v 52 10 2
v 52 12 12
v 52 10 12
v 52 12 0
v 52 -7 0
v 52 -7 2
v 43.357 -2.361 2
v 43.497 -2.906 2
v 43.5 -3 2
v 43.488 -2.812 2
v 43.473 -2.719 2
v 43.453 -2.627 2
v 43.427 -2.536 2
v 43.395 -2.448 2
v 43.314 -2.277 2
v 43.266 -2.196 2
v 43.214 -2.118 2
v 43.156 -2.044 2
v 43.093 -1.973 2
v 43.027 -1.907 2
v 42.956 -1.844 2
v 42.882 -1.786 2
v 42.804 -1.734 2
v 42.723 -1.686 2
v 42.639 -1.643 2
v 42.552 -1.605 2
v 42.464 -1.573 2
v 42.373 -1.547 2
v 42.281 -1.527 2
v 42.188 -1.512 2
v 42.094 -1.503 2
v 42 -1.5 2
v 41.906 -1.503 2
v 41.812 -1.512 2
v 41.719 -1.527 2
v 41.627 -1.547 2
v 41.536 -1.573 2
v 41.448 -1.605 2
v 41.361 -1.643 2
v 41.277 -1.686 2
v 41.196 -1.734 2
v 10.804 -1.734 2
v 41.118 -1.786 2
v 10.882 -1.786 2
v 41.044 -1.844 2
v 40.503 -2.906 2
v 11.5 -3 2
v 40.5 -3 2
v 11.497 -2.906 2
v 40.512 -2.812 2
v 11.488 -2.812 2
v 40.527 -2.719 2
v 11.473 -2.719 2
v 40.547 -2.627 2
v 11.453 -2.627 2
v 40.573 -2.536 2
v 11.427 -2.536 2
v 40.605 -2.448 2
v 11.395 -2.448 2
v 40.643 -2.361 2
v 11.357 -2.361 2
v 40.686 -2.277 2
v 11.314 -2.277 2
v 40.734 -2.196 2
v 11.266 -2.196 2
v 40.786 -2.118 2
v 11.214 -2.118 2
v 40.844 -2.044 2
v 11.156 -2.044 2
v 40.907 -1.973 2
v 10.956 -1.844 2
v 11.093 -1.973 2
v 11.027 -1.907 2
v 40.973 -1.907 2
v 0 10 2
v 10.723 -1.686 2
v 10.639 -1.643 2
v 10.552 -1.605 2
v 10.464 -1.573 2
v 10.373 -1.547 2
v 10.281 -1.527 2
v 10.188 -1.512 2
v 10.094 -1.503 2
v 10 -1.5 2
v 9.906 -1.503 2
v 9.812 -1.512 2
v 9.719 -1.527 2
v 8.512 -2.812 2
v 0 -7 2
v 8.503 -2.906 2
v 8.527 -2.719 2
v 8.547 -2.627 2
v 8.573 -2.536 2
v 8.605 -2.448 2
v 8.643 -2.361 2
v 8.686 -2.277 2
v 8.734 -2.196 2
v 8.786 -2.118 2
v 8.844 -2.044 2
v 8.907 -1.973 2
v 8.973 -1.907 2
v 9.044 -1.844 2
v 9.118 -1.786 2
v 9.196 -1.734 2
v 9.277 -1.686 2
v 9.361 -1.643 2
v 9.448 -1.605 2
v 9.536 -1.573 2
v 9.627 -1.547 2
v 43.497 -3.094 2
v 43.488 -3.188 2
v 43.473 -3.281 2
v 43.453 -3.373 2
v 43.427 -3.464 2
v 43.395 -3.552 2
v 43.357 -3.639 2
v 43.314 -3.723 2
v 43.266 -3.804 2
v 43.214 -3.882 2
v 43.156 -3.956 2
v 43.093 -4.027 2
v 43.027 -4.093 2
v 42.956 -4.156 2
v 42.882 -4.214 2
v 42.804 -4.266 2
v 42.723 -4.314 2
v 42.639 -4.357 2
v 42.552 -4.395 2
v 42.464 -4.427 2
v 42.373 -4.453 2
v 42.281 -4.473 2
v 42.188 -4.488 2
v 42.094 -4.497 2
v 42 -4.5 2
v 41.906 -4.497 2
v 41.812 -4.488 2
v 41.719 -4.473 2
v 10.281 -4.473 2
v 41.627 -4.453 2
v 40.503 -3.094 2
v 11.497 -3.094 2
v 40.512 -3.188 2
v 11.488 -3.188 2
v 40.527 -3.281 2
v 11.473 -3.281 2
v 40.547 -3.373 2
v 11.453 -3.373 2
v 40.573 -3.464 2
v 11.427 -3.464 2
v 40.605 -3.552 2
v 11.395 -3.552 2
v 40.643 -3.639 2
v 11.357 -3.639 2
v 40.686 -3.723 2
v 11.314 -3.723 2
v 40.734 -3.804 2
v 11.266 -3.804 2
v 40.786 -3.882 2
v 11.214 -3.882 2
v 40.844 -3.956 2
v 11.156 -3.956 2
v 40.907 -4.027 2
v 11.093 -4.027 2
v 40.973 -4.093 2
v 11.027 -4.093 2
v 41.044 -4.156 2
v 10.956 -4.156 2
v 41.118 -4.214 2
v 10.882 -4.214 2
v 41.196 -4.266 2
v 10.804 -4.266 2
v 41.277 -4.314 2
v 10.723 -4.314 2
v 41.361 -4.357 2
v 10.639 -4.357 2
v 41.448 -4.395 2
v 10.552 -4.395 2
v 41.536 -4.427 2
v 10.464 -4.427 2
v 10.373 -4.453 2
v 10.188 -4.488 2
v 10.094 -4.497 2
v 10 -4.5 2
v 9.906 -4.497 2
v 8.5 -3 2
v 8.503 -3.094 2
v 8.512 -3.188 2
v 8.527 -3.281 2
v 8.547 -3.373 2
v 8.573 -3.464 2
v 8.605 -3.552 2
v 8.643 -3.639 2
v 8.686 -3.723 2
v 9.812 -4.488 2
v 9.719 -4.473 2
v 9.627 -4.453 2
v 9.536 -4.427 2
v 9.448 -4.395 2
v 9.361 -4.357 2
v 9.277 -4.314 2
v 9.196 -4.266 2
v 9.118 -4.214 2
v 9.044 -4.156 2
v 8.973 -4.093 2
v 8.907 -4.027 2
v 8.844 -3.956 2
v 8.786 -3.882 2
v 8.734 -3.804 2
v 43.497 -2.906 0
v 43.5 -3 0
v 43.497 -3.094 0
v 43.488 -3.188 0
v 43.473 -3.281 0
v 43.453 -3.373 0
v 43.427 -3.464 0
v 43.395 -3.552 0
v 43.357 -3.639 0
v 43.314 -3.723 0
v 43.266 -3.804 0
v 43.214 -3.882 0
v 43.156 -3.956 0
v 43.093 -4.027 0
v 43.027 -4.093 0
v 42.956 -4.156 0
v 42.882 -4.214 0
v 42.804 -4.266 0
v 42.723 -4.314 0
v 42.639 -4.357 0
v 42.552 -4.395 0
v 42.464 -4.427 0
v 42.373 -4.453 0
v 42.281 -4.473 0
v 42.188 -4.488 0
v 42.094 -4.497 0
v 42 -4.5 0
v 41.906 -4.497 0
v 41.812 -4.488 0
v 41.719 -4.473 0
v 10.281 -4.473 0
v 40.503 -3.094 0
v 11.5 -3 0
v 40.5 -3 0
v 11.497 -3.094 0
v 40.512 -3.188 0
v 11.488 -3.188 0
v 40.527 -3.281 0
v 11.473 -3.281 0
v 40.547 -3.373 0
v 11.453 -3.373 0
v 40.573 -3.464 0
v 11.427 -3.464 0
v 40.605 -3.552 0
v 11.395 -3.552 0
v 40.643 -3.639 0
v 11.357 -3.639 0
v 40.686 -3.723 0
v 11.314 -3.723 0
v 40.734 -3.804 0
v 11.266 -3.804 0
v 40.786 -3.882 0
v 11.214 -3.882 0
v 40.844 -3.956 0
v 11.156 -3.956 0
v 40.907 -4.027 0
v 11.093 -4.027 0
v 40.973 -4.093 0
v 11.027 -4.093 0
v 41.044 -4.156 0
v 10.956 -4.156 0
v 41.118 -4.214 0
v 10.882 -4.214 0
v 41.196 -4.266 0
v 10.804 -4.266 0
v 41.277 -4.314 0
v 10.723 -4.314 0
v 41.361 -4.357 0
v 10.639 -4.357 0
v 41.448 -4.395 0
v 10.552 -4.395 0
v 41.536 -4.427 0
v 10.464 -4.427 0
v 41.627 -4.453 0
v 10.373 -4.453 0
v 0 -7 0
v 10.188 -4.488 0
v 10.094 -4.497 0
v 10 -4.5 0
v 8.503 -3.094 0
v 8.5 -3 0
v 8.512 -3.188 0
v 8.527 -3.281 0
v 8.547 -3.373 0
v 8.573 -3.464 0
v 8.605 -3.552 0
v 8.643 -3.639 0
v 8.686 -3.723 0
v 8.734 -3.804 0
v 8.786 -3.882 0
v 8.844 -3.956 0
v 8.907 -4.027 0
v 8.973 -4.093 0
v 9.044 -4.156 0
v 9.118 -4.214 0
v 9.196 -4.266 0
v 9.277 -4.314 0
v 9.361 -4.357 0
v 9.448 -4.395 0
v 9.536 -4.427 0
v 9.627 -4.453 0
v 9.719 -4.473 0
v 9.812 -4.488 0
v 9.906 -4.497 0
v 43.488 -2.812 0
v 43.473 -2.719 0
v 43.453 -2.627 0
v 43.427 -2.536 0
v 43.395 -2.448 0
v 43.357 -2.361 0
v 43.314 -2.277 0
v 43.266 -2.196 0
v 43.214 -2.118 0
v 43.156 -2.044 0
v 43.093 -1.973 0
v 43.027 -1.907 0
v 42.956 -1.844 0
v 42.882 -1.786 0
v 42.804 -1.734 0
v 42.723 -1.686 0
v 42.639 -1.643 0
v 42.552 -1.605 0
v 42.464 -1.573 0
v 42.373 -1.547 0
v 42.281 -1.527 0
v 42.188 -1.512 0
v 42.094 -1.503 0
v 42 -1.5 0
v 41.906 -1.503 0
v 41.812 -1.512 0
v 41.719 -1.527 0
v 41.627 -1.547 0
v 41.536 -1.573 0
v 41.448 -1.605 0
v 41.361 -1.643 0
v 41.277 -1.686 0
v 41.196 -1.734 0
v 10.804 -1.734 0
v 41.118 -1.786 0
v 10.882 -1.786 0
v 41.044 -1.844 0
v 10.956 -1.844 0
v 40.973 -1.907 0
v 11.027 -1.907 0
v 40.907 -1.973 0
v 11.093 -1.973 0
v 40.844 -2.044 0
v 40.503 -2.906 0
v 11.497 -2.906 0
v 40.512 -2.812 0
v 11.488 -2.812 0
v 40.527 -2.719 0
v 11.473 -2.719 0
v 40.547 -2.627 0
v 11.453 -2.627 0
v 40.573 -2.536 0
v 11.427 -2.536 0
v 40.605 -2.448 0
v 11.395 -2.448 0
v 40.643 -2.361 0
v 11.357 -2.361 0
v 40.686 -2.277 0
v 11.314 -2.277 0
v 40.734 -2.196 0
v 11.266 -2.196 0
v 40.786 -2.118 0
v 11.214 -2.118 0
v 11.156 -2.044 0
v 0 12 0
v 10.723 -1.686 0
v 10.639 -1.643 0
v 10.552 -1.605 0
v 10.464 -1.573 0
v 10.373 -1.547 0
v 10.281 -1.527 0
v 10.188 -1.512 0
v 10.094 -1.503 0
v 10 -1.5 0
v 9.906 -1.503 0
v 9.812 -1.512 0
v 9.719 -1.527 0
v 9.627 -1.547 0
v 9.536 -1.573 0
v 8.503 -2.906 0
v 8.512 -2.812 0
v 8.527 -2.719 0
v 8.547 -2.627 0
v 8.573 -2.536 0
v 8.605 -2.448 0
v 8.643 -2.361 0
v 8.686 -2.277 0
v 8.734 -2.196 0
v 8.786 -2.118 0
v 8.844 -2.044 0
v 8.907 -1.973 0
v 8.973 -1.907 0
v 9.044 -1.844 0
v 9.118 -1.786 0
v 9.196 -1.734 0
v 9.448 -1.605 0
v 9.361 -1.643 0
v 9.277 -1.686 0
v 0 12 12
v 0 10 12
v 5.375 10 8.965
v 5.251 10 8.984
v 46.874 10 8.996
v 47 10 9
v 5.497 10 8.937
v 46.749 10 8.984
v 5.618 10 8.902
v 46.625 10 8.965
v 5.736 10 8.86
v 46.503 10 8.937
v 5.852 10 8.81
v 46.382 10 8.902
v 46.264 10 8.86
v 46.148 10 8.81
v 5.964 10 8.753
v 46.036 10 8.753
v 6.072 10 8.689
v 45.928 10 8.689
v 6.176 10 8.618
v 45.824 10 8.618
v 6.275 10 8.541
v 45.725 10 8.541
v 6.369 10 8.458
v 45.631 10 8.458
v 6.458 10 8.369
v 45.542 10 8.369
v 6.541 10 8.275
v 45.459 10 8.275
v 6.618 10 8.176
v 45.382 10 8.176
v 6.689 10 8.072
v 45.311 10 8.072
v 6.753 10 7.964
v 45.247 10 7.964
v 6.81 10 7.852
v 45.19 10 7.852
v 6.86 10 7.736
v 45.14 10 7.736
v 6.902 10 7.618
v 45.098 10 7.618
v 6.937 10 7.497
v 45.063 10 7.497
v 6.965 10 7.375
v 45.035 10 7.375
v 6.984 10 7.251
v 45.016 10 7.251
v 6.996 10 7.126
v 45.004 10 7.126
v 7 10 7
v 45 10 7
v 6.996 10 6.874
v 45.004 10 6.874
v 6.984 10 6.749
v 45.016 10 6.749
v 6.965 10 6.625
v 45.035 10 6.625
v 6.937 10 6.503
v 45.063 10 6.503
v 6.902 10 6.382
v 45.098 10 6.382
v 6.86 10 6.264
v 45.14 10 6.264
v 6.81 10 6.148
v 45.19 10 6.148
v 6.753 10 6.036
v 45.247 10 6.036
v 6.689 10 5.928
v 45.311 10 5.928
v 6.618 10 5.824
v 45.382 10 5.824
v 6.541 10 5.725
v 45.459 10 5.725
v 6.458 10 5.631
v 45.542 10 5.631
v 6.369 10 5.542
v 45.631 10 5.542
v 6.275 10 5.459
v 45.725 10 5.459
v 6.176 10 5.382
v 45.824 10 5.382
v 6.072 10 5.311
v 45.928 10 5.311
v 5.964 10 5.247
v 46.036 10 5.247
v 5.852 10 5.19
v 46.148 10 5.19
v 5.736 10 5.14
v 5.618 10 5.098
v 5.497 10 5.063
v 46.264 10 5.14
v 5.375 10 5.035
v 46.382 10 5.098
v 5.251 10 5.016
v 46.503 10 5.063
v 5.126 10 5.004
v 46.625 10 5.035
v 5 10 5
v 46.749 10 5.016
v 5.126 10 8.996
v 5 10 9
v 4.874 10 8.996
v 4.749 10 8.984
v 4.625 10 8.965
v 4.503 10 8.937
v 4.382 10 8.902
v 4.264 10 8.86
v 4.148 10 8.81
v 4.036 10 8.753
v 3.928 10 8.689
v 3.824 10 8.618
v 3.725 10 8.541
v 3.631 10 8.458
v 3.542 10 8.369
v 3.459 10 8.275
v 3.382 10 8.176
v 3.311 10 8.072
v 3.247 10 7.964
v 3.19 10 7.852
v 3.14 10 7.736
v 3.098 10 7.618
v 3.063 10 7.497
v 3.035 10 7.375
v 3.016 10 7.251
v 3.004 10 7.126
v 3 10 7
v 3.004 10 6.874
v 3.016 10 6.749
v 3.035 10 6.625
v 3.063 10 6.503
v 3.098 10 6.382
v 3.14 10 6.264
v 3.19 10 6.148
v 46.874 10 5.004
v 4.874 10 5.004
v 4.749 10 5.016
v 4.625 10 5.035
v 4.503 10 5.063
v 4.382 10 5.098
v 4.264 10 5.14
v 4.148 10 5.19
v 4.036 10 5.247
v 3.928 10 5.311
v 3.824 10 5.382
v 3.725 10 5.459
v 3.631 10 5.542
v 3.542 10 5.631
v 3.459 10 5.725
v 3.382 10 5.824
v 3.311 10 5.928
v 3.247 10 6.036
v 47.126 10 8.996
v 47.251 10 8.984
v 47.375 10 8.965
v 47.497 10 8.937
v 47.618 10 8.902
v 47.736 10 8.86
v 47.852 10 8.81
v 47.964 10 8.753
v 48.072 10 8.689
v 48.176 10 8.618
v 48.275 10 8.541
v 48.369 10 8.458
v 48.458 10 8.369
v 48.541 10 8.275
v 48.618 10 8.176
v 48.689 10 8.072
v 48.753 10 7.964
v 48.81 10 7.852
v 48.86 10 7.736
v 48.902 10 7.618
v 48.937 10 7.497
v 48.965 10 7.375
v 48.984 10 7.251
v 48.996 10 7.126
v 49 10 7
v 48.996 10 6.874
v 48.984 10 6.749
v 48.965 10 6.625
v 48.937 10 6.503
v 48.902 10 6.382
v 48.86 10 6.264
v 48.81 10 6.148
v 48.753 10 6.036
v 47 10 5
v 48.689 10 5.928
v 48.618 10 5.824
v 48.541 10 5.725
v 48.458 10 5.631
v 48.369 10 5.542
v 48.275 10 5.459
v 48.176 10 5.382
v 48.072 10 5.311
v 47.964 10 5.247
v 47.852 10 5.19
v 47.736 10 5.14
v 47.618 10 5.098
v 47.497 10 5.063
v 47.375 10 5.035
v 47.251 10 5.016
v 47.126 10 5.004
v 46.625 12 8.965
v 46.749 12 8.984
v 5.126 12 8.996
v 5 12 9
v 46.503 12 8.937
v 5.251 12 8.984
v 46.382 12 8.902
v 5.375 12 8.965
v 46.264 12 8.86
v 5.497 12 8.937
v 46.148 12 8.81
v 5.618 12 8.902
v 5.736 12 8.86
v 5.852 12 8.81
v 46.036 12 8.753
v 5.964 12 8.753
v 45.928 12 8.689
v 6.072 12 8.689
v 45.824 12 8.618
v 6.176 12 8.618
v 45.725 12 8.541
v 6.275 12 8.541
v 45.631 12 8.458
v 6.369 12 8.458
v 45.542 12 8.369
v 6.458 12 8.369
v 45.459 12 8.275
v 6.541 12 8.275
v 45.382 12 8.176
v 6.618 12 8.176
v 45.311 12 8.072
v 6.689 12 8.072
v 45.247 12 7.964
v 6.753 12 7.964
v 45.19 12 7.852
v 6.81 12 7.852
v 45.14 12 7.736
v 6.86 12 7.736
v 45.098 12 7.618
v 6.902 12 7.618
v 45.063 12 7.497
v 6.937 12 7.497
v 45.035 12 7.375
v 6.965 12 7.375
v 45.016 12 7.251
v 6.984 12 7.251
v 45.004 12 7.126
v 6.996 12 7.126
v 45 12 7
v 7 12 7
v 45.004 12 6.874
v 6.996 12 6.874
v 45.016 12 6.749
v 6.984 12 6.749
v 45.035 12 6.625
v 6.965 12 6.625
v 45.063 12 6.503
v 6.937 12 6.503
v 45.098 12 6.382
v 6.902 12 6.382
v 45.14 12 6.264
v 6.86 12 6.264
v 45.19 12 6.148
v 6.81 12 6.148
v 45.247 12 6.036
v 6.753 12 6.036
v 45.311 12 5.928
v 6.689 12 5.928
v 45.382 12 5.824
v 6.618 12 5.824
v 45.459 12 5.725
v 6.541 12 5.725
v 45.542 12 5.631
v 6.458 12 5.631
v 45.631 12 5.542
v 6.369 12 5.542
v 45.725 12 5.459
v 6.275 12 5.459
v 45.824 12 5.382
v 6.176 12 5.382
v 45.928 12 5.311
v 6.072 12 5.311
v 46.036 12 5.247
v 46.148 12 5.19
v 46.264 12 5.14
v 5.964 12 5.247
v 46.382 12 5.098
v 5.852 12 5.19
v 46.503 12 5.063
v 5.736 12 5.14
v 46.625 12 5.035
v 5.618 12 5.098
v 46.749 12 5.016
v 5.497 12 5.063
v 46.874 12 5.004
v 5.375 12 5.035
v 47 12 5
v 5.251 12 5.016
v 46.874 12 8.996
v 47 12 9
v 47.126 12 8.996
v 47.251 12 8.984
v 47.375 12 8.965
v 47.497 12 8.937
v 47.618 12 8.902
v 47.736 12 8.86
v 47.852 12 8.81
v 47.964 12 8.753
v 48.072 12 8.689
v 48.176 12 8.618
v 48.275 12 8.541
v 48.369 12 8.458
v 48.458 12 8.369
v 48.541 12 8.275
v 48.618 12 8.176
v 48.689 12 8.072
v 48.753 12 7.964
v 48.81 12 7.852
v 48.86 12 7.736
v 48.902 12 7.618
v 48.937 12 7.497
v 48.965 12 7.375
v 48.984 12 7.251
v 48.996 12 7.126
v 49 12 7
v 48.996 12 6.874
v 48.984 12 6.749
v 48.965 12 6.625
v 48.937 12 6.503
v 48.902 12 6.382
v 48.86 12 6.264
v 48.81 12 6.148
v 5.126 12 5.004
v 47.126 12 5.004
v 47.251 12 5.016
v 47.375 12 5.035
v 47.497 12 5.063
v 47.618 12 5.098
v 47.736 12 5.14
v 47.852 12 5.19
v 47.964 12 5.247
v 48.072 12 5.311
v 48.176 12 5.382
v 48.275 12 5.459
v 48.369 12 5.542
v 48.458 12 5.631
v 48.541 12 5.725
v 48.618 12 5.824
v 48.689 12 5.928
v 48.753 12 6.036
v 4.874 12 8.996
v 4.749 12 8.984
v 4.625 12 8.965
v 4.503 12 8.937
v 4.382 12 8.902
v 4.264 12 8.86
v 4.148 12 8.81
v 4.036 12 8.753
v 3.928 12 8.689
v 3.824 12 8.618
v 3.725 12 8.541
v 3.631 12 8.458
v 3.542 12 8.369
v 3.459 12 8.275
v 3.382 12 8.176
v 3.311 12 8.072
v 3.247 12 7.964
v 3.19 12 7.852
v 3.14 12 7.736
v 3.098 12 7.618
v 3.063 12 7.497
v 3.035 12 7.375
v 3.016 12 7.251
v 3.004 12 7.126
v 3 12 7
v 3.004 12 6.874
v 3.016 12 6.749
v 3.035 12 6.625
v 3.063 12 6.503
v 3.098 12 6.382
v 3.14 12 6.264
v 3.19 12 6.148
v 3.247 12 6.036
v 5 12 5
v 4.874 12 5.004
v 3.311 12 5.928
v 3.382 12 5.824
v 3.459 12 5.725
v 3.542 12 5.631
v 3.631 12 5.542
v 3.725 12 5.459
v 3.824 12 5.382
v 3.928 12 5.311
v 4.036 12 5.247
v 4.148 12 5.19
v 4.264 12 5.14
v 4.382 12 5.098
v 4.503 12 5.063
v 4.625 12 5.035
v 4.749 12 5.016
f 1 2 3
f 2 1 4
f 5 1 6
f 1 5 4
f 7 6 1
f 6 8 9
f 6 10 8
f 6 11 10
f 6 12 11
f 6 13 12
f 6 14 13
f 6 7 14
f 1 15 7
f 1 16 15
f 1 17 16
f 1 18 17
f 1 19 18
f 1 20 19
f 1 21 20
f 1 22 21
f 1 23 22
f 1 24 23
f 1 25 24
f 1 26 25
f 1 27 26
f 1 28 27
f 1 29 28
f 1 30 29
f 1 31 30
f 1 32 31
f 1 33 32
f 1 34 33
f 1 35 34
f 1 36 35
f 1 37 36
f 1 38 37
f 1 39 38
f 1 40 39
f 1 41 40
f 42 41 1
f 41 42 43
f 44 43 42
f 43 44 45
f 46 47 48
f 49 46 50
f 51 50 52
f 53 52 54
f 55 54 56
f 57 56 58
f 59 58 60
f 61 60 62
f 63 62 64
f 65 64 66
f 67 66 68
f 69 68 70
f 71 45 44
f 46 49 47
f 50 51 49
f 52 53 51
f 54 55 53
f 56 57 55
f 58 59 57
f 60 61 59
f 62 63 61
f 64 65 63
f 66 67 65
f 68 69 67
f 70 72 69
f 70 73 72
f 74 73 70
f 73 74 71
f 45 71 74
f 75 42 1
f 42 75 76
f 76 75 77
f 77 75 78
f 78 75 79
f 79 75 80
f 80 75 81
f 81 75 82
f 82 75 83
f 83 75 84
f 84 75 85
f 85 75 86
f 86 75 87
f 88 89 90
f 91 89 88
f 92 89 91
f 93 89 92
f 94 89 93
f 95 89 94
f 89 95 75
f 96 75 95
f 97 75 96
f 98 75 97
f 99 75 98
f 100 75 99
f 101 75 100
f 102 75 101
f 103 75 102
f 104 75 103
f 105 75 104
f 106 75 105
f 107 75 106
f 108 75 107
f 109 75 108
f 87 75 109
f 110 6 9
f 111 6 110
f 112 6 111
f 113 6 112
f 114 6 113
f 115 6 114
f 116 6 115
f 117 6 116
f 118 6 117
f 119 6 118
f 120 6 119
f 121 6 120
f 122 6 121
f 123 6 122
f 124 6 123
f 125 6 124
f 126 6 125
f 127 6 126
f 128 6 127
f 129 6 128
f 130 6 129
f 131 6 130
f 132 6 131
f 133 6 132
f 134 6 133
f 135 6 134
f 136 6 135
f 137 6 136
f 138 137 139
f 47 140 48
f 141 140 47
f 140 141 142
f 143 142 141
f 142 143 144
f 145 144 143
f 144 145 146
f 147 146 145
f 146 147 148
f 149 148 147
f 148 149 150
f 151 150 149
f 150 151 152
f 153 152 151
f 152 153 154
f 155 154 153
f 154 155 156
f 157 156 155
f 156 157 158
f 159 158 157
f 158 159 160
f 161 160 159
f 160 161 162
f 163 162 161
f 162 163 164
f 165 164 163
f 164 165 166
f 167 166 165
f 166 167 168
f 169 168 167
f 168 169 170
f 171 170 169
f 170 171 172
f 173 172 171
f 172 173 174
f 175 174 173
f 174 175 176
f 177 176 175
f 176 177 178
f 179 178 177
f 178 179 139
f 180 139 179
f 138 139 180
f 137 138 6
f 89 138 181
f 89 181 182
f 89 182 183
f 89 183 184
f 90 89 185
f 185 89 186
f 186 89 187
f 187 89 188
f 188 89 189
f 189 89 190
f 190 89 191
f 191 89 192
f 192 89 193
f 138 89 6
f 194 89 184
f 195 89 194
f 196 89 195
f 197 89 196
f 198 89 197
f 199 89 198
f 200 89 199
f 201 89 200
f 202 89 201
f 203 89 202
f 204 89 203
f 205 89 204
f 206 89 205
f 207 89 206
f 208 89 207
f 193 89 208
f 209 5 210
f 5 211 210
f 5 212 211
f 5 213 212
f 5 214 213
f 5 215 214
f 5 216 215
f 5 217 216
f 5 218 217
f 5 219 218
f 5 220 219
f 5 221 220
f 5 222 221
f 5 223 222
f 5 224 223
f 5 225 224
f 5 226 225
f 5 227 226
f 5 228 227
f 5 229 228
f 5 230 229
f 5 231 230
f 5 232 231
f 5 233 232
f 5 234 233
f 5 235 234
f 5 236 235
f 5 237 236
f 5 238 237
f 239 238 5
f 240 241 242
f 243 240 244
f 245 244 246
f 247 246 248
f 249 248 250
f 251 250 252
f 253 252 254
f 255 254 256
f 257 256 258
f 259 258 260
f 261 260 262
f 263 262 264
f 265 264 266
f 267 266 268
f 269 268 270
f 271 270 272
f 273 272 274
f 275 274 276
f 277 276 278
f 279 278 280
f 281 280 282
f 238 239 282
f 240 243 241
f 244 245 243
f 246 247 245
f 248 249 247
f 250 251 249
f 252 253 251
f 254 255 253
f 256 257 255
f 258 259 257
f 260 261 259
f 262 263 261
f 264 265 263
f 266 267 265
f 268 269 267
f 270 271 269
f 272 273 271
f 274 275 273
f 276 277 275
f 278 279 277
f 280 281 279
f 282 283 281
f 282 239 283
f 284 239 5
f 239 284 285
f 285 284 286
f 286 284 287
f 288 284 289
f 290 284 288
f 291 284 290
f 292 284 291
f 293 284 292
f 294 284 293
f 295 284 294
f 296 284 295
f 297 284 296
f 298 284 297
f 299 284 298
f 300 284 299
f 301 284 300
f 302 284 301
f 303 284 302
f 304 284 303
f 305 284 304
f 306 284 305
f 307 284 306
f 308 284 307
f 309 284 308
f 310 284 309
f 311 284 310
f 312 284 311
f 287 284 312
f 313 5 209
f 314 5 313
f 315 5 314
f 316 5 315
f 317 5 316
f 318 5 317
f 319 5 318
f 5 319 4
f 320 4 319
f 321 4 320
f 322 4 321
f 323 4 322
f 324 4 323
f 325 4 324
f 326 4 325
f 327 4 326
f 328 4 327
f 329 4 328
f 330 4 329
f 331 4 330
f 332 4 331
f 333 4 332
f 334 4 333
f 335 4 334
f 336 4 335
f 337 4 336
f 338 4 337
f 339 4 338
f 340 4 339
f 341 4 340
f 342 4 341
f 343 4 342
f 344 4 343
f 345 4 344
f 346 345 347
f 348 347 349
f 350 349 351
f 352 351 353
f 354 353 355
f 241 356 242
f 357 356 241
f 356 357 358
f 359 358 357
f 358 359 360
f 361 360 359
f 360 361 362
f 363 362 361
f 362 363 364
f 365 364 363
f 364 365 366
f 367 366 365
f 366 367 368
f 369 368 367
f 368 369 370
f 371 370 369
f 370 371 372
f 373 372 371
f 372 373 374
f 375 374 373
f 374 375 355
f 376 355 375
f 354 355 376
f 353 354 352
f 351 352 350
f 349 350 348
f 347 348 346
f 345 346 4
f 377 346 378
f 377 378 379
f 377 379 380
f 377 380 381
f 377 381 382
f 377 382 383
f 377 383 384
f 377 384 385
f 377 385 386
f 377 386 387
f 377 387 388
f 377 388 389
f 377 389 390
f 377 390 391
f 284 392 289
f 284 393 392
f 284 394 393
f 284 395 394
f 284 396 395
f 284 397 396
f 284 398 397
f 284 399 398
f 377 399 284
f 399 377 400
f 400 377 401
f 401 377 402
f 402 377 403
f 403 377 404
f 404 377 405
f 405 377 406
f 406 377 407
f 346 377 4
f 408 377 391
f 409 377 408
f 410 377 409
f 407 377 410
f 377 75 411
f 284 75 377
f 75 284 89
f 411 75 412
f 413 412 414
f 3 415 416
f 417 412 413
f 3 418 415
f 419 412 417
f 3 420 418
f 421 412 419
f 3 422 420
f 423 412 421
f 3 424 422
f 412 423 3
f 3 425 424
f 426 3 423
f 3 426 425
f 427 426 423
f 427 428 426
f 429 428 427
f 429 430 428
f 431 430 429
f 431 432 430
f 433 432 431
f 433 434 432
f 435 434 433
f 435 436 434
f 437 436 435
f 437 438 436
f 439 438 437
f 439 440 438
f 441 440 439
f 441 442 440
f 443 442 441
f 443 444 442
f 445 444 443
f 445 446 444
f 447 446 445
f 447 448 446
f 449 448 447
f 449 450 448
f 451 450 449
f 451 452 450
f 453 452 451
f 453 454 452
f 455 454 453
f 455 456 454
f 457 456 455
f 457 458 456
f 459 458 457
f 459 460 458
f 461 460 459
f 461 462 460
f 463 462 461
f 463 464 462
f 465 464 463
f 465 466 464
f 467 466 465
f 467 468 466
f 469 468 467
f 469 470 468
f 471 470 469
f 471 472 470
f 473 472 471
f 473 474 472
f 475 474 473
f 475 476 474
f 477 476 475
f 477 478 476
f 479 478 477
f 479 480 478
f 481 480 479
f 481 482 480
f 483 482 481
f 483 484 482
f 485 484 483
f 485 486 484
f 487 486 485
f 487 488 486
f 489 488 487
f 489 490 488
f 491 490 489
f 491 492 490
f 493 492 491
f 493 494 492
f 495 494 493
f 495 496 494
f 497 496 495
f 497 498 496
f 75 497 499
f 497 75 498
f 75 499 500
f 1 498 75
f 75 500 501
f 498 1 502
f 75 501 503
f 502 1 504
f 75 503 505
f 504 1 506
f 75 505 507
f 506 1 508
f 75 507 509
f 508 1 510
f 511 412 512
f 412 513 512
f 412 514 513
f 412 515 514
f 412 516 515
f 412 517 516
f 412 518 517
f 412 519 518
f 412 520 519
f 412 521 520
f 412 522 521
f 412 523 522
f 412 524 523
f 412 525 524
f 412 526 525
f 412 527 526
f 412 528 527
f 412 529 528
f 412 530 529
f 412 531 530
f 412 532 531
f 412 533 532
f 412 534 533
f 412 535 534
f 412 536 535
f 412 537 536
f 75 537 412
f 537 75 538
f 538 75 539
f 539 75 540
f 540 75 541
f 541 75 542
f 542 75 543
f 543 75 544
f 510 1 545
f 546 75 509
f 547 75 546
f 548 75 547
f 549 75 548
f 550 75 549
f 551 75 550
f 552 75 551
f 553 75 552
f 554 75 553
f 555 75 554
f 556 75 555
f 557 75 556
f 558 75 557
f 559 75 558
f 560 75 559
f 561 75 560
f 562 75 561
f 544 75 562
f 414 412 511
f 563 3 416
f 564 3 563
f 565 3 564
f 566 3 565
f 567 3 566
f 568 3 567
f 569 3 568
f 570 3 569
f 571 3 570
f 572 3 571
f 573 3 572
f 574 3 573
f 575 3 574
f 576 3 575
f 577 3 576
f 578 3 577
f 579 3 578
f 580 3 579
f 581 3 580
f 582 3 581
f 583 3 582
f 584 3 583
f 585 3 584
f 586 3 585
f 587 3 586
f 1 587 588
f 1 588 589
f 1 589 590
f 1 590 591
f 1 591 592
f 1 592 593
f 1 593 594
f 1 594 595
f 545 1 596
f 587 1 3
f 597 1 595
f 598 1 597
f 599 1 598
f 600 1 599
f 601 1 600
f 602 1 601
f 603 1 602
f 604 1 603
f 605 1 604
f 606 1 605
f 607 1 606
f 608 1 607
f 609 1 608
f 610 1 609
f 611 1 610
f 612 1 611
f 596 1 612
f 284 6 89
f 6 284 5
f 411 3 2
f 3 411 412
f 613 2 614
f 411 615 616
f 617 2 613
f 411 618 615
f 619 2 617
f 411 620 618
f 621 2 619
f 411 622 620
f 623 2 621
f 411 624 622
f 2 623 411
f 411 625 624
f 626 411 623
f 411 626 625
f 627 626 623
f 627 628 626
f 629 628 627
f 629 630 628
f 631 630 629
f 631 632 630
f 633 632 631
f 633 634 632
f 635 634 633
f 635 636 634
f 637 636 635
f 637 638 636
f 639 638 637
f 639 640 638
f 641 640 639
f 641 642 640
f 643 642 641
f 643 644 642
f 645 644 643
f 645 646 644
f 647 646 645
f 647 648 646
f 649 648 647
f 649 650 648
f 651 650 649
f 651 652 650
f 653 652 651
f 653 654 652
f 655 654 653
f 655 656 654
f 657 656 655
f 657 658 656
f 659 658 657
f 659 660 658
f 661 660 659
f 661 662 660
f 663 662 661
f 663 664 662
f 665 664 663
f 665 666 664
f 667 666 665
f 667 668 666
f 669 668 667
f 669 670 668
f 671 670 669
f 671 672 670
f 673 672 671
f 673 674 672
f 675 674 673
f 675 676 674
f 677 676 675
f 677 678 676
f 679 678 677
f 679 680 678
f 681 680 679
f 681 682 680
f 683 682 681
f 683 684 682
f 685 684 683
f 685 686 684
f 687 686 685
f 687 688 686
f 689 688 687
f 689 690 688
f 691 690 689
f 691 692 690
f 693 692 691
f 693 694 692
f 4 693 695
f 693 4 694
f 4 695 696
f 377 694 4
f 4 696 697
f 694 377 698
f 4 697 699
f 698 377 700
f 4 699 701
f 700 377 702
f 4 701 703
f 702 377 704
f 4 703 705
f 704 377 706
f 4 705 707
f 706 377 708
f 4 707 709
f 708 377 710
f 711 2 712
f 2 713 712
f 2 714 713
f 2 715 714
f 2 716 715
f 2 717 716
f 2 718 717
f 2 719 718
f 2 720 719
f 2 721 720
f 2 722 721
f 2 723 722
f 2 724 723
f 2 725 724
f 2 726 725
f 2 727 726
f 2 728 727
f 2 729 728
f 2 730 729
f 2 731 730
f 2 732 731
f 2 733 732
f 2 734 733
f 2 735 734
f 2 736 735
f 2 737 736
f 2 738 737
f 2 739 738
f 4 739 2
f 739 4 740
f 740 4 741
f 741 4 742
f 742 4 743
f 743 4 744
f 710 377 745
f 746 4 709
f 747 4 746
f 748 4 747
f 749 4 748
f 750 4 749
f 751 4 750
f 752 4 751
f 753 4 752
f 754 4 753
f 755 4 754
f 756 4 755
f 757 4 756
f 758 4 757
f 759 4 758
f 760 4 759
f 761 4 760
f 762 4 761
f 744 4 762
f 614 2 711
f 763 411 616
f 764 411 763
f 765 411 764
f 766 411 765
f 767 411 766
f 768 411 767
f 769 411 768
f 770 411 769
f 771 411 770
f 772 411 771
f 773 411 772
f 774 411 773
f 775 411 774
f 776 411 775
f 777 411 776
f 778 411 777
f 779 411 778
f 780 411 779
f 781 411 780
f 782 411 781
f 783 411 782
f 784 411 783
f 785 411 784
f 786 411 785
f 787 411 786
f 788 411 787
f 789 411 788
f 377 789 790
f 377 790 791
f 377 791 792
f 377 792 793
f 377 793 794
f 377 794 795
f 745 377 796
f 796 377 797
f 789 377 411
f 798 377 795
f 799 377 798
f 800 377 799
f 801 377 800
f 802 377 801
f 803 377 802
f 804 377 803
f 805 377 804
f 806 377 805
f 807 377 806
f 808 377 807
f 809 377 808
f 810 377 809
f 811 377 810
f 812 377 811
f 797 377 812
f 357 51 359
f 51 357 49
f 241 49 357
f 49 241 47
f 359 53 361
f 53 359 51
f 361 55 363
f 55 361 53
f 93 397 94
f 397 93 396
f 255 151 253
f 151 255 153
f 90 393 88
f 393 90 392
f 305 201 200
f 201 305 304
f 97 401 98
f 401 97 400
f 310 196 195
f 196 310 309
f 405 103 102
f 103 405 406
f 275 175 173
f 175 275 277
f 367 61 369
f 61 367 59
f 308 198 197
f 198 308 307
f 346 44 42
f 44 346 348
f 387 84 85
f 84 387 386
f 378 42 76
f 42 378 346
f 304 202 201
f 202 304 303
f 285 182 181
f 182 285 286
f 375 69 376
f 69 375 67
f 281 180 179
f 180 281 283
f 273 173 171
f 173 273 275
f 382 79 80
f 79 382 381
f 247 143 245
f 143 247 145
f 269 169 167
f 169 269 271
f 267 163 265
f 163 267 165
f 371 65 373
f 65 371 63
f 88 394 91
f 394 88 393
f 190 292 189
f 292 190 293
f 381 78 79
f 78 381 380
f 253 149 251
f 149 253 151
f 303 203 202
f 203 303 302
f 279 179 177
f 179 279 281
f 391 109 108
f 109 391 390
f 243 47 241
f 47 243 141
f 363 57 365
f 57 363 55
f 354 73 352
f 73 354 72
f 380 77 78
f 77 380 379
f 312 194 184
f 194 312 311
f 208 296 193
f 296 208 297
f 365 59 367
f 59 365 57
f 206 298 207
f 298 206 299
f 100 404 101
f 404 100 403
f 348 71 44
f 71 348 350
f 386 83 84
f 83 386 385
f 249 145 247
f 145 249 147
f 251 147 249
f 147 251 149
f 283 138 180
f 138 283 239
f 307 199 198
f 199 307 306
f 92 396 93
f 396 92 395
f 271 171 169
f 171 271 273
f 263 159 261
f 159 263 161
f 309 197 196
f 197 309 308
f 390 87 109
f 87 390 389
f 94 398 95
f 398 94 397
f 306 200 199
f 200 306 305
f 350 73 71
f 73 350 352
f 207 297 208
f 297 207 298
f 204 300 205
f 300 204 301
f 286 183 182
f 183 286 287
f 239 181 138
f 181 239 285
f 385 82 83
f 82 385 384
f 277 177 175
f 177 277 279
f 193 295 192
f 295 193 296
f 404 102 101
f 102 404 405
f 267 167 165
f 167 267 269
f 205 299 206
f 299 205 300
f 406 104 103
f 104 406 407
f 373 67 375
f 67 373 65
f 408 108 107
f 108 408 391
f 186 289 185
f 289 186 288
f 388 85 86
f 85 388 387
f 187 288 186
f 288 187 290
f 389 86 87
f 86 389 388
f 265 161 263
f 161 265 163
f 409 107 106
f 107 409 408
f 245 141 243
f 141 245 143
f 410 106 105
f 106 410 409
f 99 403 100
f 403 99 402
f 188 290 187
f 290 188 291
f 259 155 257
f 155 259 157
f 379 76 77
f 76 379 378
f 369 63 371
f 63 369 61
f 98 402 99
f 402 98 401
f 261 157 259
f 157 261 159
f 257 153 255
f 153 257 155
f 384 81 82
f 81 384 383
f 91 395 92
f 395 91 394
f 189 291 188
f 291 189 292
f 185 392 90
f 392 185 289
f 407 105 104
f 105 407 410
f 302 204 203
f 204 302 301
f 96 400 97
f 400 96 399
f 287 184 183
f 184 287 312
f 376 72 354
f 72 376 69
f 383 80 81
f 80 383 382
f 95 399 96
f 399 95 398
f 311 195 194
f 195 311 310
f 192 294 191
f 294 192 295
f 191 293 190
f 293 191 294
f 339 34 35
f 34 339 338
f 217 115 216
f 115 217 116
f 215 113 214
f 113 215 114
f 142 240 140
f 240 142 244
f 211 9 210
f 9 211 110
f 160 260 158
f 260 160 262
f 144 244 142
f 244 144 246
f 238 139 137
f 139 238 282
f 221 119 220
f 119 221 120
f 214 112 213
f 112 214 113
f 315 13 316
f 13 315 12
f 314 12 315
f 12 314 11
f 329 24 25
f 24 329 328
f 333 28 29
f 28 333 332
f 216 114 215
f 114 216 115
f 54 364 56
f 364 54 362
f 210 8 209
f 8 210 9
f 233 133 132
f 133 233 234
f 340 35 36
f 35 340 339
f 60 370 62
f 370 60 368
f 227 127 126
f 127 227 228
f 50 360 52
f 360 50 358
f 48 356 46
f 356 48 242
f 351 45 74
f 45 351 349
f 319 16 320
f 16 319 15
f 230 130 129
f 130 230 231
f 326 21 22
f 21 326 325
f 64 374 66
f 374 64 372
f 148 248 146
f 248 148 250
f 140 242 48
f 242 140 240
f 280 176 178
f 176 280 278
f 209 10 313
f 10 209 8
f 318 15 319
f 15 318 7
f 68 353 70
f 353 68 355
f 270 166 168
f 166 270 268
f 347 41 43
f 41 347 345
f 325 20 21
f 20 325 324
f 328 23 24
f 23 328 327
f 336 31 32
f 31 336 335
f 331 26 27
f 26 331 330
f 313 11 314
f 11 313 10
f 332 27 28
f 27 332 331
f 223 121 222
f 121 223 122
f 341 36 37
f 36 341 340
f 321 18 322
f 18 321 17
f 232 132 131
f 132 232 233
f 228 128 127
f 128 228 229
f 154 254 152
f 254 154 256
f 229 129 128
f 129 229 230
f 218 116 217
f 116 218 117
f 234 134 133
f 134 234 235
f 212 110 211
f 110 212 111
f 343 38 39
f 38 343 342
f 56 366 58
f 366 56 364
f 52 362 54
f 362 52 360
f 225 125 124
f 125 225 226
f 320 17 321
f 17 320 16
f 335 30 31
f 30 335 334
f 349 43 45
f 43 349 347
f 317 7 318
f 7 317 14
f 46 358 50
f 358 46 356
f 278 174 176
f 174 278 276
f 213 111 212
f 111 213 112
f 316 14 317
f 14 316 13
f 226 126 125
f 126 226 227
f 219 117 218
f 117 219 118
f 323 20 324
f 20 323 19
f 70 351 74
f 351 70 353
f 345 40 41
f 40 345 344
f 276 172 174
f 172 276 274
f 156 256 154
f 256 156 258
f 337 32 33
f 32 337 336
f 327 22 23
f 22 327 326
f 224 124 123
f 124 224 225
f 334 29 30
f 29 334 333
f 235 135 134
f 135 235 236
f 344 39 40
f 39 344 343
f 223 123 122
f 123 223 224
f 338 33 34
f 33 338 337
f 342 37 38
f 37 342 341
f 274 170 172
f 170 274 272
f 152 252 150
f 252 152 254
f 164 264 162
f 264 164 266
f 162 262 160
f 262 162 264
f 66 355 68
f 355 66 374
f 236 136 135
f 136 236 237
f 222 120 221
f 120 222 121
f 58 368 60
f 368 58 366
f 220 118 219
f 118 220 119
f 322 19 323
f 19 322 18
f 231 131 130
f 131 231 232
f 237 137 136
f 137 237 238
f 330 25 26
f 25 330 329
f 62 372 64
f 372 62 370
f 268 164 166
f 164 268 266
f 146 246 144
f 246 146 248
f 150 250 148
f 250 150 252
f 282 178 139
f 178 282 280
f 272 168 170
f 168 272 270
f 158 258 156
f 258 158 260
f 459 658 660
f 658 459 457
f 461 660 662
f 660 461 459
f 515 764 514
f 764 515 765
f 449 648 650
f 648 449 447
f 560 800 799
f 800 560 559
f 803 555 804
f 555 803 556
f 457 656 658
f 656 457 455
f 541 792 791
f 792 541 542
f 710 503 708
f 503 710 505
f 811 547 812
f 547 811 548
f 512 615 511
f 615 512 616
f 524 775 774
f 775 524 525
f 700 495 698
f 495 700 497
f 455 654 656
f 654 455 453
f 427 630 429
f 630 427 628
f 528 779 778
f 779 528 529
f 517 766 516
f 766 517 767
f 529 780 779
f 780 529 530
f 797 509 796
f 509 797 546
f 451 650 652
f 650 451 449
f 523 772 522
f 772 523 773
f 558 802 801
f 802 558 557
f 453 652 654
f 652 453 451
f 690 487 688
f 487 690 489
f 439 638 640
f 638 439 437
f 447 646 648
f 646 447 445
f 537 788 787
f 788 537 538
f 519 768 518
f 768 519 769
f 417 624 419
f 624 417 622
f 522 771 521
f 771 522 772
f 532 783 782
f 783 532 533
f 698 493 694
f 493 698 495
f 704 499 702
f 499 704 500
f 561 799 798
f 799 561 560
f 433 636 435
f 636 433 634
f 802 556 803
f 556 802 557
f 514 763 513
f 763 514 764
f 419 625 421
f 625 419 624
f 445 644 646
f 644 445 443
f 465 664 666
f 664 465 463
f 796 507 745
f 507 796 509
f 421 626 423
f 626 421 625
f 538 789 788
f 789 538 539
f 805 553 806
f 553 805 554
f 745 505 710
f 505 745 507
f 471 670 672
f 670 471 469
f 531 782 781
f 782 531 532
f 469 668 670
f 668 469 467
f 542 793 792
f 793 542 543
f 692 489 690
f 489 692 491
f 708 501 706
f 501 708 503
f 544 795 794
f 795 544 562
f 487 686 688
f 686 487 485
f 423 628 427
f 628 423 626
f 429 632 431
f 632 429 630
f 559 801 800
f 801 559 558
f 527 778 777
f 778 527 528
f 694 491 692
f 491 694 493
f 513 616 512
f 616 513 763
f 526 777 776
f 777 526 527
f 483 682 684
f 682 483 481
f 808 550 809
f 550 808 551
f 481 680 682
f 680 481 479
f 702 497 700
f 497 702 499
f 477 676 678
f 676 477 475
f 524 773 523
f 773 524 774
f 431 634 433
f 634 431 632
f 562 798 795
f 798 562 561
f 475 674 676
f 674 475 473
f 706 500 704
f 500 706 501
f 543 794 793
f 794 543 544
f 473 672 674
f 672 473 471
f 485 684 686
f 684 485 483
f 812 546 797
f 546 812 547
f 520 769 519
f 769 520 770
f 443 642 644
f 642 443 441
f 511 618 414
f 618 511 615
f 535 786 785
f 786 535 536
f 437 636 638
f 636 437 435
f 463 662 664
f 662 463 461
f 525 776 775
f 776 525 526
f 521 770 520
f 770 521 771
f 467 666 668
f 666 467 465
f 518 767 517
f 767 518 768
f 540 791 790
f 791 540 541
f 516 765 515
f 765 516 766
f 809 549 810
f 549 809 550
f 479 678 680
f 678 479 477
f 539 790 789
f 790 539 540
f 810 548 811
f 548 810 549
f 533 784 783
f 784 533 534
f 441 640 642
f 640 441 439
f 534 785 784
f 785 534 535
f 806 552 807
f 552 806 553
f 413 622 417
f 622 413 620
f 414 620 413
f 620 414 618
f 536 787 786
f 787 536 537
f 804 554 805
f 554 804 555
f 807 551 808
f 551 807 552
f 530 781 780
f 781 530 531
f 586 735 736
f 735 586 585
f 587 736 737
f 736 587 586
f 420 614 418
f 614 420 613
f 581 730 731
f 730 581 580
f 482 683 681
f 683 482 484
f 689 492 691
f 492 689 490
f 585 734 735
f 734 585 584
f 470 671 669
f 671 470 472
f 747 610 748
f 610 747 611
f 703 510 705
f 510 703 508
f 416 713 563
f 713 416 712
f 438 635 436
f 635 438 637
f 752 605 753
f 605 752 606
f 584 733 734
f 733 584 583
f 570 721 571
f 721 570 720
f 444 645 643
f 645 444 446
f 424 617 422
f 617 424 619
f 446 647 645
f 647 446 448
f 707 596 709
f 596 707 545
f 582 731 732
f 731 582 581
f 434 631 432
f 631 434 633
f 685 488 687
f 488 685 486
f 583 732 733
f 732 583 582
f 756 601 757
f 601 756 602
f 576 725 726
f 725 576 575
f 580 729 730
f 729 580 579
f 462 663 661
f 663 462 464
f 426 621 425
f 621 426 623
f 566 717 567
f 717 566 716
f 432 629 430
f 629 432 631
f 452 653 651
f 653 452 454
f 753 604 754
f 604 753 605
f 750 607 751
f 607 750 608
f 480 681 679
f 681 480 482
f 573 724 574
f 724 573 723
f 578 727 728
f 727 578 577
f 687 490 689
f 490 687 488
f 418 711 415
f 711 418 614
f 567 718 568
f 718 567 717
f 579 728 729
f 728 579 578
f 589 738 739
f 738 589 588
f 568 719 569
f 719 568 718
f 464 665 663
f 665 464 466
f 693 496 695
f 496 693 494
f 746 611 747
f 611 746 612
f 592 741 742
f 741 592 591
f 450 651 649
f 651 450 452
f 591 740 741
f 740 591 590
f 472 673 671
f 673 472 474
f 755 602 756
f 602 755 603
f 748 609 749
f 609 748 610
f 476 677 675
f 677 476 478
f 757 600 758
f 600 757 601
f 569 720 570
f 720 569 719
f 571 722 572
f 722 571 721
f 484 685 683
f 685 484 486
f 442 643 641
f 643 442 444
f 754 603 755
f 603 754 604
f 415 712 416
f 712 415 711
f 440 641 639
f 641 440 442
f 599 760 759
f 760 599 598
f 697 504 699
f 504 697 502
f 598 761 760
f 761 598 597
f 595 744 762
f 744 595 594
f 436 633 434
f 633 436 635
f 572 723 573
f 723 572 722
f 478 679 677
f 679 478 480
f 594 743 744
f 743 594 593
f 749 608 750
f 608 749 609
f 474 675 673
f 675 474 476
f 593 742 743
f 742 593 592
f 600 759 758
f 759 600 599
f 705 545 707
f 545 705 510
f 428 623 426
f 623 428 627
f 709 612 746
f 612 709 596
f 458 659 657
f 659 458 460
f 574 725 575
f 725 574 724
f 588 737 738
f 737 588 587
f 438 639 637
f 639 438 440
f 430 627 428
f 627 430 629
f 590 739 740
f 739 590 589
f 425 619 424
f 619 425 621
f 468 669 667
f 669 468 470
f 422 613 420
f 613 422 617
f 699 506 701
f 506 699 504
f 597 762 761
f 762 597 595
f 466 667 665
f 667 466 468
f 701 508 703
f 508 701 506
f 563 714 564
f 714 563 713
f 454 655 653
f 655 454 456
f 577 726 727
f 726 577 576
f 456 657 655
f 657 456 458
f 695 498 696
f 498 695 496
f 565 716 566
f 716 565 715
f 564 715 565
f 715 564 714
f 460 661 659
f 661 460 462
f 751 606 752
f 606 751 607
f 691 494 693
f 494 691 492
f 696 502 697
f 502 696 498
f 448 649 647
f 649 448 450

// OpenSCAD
difference(){
	union(){



        translate([0,-7,0]){
           cube([52,17,2], center=false);
        }        
        translate([0,10,0]){
           cube([52,2,12], center=false);
        }        
             




        
	}
	union() {
        translate([10,12-15,-1]){
            rotate([0,0,0]){
               cylinder(h=999, r=1.5, $fn=100, center=false);
            }
        }
        translate([42,-3,-1]){
            rotate([0,0,0]){
               cylinder(h=999, r=1.5, $fn=100, center=false);
            }
        }

        translate([5,20,7]){
            rotate([90,0,0]){
               cylinder(h=999, r=2, $fn=100, center=false);
            }
        }
        translate([47,20,7]){
            rotate([90,0,0]){
               cylinder(h=999, r=2, $fn=100, center=false);
            }
        }



	}
}
